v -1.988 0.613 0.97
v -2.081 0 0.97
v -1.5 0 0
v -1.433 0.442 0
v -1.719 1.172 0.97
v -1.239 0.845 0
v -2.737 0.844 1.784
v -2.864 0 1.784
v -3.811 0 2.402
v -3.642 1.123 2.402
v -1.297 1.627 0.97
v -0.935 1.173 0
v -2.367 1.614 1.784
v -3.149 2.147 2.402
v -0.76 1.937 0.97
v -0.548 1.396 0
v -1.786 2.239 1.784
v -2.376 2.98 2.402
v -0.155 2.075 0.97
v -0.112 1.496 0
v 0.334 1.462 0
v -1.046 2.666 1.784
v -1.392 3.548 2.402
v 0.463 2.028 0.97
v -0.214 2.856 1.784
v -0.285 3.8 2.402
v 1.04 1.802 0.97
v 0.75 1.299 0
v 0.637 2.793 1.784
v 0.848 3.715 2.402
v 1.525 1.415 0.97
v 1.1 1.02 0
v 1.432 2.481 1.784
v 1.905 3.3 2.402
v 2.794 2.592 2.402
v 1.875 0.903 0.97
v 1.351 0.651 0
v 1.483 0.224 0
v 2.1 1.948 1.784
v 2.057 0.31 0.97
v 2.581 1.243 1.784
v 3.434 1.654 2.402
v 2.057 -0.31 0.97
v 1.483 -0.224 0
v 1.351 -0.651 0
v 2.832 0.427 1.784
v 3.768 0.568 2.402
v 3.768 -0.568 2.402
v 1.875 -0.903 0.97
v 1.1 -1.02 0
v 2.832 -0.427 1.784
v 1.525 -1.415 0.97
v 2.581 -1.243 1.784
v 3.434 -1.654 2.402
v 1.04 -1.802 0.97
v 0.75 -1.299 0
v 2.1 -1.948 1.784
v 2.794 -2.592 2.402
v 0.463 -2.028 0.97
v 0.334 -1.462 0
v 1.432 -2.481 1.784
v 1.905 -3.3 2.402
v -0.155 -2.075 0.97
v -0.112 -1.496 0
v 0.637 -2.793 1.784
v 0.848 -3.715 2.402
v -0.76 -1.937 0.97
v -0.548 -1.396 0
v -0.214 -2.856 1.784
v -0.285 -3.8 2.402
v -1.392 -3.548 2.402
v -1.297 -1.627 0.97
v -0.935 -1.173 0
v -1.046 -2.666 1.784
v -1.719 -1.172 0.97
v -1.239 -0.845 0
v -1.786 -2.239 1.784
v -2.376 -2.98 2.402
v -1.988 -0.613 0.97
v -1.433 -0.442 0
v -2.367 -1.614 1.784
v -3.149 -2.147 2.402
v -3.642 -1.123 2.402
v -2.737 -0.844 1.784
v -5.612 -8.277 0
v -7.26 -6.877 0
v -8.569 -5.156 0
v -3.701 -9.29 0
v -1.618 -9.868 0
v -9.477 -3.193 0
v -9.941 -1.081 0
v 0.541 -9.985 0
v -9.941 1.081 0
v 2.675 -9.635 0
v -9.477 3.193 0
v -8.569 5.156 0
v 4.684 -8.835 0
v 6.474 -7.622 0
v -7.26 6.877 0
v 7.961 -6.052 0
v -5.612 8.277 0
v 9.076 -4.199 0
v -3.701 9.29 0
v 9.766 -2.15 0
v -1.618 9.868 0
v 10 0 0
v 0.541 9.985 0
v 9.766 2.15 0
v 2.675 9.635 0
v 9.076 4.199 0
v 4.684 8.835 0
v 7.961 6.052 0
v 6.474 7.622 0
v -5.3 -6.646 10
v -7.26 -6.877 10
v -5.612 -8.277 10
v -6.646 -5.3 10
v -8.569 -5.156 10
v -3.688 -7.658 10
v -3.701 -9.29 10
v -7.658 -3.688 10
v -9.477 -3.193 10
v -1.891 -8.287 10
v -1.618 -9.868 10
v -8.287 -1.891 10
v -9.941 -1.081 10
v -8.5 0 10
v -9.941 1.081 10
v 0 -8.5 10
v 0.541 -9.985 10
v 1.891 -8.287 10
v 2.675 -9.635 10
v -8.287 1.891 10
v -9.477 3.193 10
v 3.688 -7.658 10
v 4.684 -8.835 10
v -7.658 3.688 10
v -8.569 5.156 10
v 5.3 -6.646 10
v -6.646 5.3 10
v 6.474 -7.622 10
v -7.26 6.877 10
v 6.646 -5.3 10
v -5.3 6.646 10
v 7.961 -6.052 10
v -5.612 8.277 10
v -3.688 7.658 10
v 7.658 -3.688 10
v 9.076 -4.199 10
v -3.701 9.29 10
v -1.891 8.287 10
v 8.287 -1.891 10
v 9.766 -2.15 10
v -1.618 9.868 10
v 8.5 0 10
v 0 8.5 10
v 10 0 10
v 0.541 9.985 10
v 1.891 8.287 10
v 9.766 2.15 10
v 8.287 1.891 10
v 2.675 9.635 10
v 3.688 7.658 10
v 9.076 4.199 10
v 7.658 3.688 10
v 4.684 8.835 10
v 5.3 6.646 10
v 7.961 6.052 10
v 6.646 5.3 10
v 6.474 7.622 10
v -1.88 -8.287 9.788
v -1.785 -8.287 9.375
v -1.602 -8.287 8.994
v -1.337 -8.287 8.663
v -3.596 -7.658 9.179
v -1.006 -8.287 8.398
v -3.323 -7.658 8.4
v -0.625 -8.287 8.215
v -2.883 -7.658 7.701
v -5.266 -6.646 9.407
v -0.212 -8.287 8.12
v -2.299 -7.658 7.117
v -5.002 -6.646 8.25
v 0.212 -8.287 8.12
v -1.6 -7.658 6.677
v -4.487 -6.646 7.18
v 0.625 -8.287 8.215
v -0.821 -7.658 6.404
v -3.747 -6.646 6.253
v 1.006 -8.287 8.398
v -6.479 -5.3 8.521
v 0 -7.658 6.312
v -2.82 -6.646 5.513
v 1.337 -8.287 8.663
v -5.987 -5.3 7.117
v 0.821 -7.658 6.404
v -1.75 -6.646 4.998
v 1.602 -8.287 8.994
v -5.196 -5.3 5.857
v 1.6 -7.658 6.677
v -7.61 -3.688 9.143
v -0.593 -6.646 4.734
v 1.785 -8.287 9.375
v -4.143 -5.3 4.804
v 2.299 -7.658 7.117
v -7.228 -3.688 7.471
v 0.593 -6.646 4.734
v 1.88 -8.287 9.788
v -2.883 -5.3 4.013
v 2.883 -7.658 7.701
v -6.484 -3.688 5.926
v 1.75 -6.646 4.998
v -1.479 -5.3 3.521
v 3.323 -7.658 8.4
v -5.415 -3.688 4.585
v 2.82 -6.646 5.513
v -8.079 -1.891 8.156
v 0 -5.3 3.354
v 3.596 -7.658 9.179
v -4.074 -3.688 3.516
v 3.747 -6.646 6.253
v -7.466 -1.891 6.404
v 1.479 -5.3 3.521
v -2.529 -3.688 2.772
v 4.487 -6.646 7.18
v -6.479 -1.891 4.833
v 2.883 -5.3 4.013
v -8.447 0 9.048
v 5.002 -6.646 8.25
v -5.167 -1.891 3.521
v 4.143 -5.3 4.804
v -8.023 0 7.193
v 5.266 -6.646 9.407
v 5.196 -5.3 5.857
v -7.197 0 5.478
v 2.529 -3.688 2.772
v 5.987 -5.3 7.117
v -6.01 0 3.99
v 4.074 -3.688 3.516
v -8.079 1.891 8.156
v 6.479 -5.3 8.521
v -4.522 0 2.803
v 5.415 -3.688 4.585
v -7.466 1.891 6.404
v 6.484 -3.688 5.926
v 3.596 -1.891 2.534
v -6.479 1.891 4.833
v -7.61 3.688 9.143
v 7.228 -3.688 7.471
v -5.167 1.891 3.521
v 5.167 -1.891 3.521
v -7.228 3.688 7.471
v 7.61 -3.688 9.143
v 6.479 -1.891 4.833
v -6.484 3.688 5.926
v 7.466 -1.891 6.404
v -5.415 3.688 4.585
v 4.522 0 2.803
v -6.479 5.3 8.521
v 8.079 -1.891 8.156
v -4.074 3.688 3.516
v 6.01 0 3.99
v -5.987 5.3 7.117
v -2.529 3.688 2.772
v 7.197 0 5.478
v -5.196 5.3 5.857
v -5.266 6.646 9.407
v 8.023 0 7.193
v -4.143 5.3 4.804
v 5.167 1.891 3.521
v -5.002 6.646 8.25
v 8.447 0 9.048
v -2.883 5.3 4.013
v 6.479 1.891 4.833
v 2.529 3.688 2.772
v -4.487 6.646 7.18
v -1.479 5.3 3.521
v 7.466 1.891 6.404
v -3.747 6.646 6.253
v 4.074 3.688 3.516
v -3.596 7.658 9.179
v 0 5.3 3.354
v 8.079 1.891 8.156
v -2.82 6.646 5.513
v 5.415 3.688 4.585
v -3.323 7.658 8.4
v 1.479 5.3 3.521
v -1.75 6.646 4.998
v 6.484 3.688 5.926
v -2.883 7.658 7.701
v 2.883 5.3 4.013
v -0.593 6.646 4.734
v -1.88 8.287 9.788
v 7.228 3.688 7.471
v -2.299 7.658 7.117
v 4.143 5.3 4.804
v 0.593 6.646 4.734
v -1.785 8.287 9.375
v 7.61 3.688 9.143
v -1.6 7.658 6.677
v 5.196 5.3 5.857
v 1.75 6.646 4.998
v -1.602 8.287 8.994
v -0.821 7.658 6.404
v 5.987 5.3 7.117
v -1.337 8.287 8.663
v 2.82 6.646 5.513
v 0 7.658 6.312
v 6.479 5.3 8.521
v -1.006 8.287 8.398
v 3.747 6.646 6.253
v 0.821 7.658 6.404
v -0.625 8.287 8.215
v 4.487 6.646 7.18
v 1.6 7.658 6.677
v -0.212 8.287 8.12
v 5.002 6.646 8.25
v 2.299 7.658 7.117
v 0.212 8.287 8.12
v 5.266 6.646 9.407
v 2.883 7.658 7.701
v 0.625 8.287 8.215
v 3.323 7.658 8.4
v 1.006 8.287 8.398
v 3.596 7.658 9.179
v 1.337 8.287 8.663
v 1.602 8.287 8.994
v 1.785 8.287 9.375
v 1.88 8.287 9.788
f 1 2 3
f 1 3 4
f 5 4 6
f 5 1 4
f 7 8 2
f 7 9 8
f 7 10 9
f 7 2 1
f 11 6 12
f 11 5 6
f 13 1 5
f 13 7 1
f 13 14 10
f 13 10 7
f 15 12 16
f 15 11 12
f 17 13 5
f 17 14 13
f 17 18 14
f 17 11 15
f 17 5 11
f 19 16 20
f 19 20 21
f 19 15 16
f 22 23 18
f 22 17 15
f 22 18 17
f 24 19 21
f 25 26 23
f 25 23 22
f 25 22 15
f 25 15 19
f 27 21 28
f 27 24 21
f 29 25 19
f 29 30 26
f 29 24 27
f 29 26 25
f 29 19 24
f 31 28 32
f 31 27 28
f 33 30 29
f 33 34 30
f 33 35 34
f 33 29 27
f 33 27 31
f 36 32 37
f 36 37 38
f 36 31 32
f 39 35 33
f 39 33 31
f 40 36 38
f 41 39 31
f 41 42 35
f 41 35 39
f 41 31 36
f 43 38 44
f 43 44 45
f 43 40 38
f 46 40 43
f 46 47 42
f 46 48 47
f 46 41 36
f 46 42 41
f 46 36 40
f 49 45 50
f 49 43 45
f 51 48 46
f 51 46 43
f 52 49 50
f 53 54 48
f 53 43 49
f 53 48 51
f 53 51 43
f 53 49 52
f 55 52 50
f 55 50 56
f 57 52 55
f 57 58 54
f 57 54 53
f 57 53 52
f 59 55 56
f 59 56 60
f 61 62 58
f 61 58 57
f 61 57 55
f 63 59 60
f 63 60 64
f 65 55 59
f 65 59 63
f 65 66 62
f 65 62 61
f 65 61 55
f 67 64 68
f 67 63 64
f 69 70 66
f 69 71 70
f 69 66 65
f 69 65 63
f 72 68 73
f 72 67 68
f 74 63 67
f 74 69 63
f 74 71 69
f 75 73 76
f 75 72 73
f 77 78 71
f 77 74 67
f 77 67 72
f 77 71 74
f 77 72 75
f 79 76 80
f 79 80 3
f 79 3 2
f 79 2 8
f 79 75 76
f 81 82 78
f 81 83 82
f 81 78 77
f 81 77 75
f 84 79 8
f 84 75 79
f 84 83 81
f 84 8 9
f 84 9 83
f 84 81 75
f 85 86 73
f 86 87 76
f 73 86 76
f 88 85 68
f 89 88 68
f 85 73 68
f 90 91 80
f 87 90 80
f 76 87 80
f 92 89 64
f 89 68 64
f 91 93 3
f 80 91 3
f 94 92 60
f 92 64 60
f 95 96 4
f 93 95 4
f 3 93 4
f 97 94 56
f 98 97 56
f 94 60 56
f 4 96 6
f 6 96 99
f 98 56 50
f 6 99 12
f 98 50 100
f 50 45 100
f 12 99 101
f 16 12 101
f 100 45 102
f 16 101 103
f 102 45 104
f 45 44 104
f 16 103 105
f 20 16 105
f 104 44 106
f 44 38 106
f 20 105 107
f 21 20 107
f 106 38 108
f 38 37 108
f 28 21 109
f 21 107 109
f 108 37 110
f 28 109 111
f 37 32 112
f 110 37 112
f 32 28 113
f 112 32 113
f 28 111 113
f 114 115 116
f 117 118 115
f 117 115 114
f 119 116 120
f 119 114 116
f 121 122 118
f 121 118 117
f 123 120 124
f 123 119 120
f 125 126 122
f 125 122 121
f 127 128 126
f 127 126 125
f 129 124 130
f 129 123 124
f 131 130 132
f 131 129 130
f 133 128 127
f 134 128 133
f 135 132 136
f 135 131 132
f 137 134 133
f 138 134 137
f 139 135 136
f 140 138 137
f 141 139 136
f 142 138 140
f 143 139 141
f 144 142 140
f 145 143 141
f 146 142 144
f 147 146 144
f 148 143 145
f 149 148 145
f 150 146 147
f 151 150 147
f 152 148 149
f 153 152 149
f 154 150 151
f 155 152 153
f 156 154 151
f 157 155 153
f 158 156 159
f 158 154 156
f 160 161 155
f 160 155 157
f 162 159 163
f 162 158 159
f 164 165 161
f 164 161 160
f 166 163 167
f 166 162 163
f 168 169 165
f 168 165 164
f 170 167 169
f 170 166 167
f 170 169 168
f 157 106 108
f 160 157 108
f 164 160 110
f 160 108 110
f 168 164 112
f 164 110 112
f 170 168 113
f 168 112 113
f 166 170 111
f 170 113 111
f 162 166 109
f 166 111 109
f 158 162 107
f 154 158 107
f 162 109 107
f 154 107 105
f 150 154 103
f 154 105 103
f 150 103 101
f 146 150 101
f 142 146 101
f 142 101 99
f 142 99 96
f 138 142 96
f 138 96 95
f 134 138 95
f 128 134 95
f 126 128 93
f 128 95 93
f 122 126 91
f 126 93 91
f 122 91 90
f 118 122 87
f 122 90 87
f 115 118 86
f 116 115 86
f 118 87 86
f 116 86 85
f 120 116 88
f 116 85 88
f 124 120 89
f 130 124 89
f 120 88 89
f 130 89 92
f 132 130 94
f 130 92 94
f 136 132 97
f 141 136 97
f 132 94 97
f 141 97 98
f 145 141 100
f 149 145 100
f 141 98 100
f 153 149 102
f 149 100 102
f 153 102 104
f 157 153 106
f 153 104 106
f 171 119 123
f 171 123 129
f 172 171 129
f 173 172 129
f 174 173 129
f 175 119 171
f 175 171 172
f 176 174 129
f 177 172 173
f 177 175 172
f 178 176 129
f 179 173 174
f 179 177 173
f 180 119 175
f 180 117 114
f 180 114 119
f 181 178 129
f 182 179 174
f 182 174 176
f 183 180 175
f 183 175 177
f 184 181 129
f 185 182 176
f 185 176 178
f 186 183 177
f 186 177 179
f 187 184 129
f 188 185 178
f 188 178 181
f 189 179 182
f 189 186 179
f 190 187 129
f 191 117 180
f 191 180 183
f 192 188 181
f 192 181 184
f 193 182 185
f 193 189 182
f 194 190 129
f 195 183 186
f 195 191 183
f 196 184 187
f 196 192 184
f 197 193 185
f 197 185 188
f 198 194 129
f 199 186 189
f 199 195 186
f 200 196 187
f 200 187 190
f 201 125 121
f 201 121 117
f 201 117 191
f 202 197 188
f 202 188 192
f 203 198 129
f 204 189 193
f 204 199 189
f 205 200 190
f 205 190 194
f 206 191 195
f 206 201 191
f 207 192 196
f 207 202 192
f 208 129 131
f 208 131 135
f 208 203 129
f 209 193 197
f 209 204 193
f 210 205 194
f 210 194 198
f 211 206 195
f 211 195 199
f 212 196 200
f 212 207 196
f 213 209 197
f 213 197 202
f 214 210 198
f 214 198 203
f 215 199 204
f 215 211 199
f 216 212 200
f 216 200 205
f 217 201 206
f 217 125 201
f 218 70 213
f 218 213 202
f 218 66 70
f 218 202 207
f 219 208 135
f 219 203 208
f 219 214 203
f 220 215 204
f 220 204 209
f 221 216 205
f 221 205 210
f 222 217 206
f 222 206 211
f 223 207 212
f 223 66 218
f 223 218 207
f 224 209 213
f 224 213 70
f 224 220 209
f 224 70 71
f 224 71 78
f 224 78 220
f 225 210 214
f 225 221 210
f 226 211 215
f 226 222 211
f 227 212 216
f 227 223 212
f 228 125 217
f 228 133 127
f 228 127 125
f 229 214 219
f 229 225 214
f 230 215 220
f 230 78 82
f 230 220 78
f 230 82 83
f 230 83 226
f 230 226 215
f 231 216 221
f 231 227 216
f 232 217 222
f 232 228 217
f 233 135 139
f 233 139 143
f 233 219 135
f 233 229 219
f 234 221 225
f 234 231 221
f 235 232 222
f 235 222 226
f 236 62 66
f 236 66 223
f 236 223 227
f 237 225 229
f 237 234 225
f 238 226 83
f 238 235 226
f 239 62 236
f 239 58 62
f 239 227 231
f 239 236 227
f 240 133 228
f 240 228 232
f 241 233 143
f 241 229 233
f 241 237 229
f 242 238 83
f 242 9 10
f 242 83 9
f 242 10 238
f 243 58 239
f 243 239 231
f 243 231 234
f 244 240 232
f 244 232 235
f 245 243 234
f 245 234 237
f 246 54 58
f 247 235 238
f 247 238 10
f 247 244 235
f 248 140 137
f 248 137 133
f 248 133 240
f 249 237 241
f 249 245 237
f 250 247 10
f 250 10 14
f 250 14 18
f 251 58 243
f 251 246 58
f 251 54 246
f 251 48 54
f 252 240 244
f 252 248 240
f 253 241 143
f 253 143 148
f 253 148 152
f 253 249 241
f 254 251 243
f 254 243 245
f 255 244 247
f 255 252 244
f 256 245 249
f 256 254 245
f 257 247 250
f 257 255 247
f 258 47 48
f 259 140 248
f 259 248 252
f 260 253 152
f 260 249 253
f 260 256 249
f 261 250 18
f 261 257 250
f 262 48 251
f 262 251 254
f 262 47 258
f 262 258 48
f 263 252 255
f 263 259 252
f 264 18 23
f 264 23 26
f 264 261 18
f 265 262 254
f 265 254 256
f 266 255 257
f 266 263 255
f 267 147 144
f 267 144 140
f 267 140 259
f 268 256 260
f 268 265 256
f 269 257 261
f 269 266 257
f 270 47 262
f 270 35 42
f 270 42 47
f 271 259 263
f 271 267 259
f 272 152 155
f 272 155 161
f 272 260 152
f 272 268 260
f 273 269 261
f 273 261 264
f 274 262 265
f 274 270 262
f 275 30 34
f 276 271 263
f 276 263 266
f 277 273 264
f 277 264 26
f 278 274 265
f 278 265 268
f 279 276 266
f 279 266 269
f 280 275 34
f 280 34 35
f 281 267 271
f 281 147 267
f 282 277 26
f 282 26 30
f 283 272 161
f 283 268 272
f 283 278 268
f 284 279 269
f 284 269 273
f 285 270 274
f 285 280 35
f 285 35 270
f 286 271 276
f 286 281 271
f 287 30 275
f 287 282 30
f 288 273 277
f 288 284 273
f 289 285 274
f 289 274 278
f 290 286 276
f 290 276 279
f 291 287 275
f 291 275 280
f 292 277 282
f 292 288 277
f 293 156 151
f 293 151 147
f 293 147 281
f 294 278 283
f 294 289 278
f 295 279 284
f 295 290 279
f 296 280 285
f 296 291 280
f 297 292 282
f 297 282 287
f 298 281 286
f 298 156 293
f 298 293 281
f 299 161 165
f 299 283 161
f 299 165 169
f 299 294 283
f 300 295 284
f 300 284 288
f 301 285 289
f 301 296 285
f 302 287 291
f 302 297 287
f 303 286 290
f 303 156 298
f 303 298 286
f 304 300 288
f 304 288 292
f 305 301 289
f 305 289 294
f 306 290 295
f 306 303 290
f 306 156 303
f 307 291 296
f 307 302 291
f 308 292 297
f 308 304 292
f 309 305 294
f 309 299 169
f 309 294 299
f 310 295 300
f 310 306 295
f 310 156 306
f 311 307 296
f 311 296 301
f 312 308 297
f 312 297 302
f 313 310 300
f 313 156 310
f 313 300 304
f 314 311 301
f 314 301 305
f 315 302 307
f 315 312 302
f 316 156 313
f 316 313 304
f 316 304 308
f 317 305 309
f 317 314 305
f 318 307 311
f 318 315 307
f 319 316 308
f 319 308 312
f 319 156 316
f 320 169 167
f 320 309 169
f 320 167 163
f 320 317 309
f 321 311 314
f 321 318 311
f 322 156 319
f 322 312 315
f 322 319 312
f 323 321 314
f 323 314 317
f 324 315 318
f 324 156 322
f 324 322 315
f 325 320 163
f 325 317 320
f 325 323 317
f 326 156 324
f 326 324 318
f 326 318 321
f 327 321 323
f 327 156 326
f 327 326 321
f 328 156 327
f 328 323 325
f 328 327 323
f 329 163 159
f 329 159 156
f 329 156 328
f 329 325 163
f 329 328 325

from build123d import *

# Parameters (mm, degrees)
SKETCH1_R           = 10
BOSS_EXTRUDE1_DEPTH = 10
SKETCH3_R           = 1.5
CUT_EXTRUDE1_DEPTH  = 8
FILLET1_R           = 5


with BuildPart() as part:
    # Sketch1 → Boss-Extrude1 (new body)
    with BuildSketch(Plane.XY):
        Circle(SKETCH1_R)
    extrude(amount=BOSS_EXTRUDE1_DEPTH)

    # Sketch2 → Cut-Revolve1 (revolve, cut)
    with BuildSketch(Plane.XY.offset(10)):
        with BuildLine():
            Line((0, 8.5), (0, -8.5))
            ThreePointArc((0, -8.5), (8.5, 0), (0, 8.5))
        make_face()
    revolve(axis=Axis((0, 8.5, 10), (0, -1, 0)), mode=Mode.SUBTRACT)

    # Sketch3 → Cut-Extrude1 (cut)
    with BuildSketch(Plane(origin=(0, 0, 0), x_dir=(-1, 0, 0), z_dir=(0, 0, -1))):
        Circle(SKETCH3_R)
    extrude(amount=-CUT_EXTRUDE1_DEPTH, mode=Mode.SUBTRACT)

    # Fillet1
    # the kernel refuses this fillet: 5 mm, written as the material it takes off along each edge
    with BuildSketch(Plane(origin=(3e-09, 0, 1.633399735), x_dir=(-1, 0, 0), z_dir=(0, -1, 0))) as fillet1_piece_1:
        with BuildLine():
            CenterArc((6.052704826, 3.70049401), FILLET1_R, 204.419783659, 38.942441269)
            Line((3.810962297, -0.768800166), (3.766127446, -0.858186049))
            ThreePointArc((3.766127446, -0.858186049), (2.65159267, -0.396088594), (1.482352944, -0.098430591))
            Line((1.482352944, -0.098430591), (1.400000003, 0))
            ThreePointArc((1.400000003, 0), (1.399999997, 0.816699867), (1.408945901, 1.592057849))
            Line((1.408945901, 1.592057849), (1.499999997, 1.633399735))
        make_face()
    revolve(axis=Axis((3e-09, 0, 1.633399735), (0, 0, -1)), mode=Mode.SUBTRACT)


solid = part.part
